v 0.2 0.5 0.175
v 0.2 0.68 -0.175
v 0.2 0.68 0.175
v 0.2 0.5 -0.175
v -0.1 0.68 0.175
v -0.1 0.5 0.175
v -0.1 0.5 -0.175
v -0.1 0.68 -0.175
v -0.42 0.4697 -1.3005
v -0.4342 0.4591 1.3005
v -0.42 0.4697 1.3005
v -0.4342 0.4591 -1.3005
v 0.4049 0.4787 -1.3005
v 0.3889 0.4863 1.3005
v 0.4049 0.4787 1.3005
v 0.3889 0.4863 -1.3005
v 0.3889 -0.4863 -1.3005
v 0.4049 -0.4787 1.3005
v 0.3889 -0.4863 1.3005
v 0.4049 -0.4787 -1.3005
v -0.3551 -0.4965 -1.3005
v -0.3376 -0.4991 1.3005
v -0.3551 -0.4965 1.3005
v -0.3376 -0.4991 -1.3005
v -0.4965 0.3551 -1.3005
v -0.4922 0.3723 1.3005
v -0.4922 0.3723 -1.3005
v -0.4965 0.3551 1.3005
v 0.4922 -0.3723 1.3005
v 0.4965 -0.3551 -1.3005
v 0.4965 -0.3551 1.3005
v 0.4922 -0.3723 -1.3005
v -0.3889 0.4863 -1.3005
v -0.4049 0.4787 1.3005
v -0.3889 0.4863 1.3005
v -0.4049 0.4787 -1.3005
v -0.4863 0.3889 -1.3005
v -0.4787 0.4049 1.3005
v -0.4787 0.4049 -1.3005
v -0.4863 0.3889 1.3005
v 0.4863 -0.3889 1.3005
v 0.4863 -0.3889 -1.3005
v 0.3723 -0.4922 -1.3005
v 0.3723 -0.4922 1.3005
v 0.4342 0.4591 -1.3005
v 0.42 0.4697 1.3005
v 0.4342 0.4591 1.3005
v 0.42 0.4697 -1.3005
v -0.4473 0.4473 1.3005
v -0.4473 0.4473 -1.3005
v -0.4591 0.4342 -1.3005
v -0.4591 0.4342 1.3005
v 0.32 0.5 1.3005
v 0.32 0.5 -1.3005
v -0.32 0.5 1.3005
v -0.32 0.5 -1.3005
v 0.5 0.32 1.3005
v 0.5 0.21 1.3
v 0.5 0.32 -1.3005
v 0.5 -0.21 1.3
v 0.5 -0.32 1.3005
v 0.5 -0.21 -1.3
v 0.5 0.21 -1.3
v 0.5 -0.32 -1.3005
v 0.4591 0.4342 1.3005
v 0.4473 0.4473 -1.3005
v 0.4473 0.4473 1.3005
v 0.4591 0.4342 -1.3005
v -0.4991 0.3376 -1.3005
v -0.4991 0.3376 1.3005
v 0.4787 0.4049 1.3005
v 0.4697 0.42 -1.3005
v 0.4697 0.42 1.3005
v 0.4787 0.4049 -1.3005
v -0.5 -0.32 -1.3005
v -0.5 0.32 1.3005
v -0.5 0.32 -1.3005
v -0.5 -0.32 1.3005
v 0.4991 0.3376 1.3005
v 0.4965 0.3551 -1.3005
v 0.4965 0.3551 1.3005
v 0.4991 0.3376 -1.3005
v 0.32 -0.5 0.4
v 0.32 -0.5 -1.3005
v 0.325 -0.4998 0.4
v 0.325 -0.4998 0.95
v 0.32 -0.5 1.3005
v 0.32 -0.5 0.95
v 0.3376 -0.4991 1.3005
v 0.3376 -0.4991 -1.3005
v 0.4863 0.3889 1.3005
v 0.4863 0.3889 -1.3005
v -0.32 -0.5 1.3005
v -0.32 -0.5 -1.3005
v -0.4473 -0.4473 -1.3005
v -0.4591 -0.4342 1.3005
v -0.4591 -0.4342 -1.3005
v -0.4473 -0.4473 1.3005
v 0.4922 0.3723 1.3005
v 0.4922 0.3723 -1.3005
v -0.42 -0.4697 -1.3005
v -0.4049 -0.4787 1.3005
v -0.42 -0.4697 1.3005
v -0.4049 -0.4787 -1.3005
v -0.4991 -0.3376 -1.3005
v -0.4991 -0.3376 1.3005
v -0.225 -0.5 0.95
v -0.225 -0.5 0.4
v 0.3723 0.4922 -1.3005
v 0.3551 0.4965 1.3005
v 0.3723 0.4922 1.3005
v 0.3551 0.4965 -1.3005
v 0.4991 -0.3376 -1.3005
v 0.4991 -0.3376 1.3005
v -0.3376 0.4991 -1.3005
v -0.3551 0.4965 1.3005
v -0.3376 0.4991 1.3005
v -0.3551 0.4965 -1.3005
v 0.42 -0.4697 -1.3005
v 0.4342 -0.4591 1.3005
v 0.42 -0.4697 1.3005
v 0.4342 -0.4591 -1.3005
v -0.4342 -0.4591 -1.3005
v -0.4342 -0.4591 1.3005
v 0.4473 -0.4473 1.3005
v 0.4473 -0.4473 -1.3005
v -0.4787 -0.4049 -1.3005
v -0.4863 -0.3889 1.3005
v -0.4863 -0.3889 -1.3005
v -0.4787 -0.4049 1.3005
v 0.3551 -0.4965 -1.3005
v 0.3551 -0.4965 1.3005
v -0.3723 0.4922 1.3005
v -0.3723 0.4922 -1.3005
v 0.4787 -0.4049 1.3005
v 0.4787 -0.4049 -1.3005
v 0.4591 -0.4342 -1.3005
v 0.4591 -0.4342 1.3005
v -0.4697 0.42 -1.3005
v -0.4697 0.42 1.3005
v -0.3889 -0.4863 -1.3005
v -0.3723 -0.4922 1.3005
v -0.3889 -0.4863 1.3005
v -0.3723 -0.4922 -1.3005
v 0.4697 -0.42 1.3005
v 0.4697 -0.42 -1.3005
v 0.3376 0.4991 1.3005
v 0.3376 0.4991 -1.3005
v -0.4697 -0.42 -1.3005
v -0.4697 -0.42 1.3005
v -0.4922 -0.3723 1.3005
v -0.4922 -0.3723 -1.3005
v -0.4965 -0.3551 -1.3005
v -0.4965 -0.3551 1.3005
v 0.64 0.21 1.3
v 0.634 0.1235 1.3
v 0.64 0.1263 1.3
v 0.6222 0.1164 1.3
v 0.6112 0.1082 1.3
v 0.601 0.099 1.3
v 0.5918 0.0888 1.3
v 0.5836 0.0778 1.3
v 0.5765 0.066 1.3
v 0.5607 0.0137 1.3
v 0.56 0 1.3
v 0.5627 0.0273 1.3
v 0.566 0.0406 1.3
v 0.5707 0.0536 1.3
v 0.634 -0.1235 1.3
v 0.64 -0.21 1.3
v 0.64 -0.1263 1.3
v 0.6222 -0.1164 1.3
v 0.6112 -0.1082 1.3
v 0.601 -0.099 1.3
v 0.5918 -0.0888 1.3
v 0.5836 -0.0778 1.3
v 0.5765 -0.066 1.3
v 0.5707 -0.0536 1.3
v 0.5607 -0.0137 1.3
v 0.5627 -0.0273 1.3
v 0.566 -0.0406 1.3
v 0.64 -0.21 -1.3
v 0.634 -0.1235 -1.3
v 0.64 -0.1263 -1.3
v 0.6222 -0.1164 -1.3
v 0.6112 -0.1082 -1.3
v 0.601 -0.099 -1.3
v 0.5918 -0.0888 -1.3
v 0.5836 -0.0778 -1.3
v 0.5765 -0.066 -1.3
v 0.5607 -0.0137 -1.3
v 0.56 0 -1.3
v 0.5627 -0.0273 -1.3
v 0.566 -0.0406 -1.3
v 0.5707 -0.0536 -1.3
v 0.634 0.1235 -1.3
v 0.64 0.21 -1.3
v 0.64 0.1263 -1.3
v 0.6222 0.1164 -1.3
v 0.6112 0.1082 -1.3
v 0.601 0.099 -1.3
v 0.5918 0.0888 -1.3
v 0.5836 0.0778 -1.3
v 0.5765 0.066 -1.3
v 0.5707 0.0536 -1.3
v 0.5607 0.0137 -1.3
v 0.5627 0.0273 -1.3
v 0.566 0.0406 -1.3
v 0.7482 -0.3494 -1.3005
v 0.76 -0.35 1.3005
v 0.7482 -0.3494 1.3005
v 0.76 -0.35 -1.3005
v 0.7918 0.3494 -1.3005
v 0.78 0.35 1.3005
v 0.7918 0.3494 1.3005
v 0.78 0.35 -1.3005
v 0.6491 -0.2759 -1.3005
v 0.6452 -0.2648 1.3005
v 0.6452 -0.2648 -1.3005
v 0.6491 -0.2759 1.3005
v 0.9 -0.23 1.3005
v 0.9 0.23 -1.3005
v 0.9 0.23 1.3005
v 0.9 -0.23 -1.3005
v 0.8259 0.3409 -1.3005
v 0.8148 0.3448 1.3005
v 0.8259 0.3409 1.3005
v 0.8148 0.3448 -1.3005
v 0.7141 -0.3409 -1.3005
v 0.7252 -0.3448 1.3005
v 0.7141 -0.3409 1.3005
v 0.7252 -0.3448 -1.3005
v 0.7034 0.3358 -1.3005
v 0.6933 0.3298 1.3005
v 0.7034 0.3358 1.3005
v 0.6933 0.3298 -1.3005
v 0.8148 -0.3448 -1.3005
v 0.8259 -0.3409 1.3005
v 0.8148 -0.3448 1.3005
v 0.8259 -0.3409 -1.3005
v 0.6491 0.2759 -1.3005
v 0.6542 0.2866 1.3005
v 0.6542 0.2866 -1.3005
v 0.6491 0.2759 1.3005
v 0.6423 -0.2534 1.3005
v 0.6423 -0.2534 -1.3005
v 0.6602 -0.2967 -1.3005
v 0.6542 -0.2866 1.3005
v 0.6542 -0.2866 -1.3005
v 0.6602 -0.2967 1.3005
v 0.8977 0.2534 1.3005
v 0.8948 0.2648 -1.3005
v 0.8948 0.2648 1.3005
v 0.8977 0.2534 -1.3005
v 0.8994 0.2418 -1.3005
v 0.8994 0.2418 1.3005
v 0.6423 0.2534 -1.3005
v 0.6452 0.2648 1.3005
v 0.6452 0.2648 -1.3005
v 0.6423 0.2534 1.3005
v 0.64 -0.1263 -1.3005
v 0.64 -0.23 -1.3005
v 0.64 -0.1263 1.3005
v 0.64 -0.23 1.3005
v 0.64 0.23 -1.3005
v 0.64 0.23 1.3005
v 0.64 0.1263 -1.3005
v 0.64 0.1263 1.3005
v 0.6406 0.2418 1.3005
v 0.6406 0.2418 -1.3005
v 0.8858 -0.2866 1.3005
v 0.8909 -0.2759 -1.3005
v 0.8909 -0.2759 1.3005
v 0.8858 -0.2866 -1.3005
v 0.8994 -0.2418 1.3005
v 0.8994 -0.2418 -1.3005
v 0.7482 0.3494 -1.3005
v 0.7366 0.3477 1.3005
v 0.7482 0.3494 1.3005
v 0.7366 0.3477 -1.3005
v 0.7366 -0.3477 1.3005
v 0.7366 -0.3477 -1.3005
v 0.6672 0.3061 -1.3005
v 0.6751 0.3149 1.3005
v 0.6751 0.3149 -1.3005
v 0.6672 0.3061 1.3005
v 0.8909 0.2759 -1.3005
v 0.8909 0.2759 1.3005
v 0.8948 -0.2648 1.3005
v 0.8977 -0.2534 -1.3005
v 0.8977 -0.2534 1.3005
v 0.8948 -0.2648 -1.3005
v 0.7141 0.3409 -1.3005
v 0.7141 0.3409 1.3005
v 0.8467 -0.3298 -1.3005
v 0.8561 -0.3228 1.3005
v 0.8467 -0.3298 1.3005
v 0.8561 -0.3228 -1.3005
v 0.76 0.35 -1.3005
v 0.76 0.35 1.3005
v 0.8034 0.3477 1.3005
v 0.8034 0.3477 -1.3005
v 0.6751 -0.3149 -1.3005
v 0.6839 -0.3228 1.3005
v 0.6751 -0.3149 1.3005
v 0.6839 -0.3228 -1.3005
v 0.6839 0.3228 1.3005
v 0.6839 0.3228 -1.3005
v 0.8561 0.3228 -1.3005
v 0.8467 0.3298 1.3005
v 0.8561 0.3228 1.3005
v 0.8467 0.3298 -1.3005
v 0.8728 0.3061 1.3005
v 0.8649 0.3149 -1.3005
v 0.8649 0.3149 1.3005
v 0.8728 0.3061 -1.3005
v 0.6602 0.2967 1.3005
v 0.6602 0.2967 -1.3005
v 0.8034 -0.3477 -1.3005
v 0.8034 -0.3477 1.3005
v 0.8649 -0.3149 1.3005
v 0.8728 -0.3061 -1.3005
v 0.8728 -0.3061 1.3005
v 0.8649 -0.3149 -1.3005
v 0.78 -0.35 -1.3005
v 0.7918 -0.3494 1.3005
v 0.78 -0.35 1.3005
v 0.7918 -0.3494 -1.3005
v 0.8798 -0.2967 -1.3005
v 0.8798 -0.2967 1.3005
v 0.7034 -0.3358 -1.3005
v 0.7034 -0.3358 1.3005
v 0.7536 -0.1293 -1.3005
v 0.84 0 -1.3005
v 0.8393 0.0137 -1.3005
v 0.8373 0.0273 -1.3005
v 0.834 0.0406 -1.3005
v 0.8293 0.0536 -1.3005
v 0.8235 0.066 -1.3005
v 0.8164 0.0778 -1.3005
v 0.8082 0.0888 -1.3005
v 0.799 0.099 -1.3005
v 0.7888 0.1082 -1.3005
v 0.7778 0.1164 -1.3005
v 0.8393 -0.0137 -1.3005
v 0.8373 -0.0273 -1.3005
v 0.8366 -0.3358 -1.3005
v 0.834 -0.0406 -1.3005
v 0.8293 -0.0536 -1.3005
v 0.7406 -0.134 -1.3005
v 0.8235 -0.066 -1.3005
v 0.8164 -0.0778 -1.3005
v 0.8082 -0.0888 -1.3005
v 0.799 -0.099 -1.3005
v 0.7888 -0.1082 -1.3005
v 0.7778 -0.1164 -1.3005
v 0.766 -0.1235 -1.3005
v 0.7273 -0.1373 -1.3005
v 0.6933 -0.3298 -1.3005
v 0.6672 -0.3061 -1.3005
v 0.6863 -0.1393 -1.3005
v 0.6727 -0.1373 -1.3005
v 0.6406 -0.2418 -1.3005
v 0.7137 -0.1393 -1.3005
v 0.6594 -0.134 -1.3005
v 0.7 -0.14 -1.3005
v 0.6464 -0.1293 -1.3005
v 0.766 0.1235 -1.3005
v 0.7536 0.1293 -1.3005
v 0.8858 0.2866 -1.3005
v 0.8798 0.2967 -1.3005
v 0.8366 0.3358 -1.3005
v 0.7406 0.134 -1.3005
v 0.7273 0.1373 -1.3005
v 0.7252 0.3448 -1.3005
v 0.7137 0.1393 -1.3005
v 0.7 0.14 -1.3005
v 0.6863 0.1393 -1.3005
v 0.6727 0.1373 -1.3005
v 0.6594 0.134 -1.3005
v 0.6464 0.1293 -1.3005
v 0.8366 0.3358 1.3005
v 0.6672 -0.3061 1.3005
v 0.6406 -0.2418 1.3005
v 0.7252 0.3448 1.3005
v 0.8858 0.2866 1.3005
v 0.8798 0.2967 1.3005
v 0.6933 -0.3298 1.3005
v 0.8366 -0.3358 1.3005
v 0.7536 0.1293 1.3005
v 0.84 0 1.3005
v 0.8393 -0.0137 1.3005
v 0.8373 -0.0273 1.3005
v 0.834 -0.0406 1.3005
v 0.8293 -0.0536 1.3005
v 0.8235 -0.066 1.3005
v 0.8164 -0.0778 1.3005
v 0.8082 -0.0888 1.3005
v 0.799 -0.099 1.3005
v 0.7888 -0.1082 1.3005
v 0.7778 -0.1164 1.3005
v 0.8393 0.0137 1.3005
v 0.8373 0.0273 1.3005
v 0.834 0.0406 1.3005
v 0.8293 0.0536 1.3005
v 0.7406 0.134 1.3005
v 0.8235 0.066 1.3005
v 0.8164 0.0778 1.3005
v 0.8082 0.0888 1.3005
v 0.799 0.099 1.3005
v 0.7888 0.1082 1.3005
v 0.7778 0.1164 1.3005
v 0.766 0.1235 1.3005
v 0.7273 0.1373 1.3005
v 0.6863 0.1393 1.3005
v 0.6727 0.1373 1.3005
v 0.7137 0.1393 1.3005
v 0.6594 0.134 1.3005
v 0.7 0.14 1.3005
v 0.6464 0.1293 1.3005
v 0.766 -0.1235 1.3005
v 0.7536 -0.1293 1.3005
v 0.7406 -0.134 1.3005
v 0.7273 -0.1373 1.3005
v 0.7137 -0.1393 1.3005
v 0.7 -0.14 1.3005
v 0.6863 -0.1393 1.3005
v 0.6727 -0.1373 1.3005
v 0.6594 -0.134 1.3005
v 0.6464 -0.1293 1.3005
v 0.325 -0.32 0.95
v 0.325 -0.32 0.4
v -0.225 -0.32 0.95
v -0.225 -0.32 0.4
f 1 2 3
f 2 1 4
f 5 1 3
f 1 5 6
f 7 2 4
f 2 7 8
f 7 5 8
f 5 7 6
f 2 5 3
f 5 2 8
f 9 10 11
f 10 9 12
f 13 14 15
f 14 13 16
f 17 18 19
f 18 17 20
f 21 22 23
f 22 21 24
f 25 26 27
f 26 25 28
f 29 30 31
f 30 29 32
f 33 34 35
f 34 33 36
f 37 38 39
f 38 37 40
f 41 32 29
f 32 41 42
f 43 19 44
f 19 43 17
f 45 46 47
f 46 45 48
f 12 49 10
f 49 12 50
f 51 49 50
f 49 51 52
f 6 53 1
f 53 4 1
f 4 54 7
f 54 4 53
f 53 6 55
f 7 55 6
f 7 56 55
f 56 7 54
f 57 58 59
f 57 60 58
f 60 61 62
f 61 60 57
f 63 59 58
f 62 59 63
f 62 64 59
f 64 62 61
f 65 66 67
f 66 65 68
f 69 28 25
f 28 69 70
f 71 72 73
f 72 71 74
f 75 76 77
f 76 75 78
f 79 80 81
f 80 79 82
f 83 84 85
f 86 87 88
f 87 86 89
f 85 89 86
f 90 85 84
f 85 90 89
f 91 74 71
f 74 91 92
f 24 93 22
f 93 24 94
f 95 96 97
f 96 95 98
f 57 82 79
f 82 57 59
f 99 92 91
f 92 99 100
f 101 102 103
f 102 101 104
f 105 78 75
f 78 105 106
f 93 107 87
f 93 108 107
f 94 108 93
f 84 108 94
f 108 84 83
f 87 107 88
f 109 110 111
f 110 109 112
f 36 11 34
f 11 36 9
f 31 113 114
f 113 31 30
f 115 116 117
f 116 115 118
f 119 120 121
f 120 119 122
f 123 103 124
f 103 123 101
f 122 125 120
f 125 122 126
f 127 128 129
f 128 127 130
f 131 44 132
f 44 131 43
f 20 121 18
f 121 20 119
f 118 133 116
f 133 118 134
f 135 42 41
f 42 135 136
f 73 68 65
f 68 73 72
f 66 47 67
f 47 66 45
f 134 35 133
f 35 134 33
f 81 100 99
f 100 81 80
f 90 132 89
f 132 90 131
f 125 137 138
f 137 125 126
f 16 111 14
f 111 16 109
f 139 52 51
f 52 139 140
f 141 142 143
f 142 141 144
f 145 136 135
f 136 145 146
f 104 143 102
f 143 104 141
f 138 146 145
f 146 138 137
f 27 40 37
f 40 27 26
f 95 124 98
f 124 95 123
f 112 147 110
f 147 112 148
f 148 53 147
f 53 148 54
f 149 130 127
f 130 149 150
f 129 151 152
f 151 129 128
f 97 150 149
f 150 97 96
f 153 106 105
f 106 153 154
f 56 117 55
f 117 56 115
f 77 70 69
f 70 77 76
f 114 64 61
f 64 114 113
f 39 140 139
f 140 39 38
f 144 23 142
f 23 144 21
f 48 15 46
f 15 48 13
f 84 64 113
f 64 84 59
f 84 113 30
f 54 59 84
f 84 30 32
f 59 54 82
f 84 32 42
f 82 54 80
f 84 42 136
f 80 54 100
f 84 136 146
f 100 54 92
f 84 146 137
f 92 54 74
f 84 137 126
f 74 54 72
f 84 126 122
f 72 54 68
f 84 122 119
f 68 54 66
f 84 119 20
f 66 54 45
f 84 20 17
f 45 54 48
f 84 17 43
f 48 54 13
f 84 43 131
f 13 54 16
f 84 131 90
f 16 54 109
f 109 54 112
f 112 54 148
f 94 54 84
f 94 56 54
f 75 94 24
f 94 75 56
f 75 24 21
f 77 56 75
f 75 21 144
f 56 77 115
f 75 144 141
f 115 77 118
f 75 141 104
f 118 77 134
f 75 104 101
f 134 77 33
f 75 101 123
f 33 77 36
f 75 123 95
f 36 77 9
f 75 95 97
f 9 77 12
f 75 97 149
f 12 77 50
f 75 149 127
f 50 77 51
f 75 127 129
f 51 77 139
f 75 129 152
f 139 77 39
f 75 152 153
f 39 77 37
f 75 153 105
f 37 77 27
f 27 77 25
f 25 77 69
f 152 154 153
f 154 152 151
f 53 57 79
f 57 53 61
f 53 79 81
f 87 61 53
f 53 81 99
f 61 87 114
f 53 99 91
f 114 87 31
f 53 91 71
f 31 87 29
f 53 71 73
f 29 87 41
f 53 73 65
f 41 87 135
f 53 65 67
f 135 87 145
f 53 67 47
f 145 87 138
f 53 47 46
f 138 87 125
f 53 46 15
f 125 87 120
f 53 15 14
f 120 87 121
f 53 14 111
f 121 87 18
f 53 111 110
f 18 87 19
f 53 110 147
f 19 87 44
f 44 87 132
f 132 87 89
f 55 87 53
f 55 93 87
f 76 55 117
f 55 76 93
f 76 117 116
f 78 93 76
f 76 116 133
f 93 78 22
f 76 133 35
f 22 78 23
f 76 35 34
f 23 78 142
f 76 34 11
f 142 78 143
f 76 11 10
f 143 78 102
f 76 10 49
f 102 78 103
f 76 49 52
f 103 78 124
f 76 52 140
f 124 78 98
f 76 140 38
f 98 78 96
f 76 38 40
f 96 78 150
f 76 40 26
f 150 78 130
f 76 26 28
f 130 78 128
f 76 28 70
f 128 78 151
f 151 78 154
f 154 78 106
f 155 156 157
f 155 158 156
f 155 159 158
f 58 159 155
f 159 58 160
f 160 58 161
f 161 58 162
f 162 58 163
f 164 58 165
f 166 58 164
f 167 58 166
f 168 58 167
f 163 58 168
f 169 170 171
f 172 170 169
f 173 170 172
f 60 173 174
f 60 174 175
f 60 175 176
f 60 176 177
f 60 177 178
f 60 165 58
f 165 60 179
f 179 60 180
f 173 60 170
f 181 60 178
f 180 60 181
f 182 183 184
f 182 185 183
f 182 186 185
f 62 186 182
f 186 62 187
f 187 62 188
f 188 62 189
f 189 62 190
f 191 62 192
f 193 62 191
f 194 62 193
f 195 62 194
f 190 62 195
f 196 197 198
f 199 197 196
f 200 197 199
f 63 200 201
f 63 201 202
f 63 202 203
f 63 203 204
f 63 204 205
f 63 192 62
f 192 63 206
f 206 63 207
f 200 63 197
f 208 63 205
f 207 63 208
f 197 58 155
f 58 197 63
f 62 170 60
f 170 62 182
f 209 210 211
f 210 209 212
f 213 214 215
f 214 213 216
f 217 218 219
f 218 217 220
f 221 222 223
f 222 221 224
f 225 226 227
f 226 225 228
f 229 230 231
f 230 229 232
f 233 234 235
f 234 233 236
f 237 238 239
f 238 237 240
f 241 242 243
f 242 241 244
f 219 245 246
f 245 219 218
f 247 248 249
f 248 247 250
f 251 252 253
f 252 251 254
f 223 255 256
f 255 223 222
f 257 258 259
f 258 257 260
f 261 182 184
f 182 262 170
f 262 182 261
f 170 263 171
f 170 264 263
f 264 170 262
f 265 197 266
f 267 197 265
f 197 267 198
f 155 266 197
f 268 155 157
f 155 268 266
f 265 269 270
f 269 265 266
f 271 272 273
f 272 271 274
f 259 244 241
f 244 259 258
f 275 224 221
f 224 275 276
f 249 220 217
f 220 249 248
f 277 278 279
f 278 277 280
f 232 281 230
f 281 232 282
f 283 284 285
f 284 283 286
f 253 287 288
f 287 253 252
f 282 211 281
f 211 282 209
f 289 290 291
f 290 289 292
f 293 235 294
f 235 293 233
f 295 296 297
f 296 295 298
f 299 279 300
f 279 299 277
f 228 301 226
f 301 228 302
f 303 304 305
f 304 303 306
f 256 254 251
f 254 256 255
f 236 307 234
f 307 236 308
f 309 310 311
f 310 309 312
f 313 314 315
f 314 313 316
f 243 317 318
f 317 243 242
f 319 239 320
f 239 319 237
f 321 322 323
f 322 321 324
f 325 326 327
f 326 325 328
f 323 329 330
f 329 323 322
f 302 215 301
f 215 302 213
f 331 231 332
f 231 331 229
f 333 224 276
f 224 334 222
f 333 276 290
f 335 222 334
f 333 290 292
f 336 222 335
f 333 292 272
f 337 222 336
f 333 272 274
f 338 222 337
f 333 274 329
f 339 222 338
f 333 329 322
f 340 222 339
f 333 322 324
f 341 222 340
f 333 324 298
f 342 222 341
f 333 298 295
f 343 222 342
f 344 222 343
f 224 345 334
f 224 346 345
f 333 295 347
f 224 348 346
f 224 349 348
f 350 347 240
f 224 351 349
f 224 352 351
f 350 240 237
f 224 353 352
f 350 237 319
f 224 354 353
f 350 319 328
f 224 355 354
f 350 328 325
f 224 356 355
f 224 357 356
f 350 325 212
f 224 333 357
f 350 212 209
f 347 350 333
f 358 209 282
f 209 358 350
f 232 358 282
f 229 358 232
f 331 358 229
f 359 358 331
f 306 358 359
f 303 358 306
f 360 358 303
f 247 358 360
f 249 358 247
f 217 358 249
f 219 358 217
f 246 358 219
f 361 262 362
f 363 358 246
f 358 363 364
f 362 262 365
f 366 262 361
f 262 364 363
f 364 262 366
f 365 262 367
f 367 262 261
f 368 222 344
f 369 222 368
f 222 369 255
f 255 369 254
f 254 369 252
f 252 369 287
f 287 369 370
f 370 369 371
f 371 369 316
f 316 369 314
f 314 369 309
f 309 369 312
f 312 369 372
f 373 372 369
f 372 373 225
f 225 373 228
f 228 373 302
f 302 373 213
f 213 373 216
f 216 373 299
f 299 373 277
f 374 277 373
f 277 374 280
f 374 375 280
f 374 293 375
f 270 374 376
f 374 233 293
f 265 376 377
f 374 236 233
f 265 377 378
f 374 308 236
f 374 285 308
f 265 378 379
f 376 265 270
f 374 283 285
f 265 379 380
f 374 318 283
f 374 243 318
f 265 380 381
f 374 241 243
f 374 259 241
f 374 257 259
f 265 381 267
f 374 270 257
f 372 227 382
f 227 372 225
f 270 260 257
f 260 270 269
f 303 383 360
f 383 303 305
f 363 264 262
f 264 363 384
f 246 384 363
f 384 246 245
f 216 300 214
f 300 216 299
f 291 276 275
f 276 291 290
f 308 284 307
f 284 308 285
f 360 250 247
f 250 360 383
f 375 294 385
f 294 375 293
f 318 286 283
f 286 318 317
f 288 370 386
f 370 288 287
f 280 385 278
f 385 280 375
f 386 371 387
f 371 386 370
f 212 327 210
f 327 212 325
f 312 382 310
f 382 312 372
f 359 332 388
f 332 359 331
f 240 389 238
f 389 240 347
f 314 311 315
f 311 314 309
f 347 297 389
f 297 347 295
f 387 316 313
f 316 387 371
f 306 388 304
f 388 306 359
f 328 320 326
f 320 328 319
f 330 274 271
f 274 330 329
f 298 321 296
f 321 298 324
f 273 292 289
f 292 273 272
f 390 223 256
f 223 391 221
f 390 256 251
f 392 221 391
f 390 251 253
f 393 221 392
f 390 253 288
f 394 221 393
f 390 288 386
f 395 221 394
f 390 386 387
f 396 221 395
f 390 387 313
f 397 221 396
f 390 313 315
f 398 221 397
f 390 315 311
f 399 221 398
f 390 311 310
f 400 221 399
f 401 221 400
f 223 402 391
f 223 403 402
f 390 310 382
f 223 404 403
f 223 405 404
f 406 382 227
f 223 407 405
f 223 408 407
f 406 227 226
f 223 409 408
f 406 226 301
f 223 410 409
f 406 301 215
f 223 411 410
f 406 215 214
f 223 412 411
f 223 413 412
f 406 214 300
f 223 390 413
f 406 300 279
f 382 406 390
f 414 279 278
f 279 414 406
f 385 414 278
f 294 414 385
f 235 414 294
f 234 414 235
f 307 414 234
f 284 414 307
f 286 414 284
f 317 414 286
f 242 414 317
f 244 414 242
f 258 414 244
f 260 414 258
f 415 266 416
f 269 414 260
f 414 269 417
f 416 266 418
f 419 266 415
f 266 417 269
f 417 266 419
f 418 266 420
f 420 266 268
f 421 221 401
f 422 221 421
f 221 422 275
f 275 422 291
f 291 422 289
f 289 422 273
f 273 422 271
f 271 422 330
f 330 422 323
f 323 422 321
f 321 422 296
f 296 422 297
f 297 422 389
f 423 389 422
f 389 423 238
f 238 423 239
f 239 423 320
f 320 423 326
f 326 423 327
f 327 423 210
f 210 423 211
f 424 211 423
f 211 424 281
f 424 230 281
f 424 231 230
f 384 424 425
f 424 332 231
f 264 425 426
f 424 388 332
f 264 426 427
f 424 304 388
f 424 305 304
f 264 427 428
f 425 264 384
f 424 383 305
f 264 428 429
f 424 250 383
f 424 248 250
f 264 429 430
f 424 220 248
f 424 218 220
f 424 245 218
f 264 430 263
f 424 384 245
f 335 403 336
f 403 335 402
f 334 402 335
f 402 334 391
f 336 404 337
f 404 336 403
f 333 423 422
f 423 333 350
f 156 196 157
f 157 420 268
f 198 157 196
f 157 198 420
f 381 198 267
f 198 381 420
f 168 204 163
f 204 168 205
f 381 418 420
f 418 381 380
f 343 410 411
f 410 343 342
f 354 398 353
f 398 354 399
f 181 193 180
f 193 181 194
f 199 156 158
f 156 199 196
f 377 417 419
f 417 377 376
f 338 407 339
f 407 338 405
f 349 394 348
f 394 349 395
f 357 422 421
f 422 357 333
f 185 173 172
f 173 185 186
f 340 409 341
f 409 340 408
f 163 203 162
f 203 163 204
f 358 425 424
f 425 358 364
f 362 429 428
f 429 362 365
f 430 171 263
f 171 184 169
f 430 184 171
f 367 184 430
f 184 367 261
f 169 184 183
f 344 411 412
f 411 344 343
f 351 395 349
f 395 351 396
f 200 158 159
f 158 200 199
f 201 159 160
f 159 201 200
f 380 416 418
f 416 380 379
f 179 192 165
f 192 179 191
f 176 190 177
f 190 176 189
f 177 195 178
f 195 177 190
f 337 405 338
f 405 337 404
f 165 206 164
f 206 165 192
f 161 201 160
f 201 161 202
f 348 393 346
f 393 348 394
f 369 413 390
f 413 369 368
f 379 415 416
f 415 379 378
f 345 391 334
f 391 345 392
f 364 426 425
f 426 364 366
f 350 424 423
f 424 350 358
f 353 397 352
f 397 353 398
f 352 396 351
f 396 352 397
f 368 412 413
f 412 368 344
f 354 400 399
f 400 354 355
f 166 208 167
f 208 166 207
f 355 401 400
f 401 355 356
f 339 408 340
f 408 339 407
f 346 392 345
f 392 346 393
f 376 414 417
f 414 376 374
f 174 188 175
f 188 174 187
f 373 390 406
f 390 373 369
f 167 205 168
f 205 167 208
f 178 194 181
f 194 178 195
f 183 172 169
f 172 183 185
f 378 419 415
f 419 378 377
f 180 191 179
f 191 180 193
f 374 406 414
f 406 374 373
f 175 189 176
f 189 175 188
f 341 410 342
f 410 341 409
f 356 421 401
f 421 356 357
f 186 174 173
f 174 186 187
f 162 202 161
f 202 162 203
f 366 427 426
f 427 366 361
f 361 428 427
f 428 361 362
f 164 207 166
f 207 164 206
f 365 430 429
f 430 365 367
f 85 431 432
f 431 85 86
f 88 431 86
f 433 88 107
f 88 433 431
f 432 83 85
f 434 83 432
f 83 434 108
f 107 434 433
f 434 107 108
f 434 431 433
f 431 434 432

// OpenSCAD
// Compact housing with neck+tab (through-hole), side latch boss, and opposite-face recess
// Target bounding box: 1.4 x 1.0 x 2.6 mm  (X x Y x Z)

$fn = 64;

// --- Bounding box (overall) ---
bbox_X = 1.4;
bbox_Y = 1.0;
bbox_Z = 2.6;

// --- Main housing (rounded-rect) ---
housing_X = 1.00;                 // along X
housing_Y = bbox_Y;               // along Y
housing_Z = bbox_Z;               // along Z
housing_r = 0.18;                 // corner radius in XY

// --- Neck + tab (handle) on +X side ---
neck_X = 0.18;
neck_Y = 0.42;
neck_Z = bbox_Z;

tab_X  = bbox_X - housing_X - neck_X;   // ensures overall X matches bbox_X
tab_Y  = 0.70;
tab_Z  = bbox_Z;

hole_d = 0.28;
hole_from_tab_end = 0.20;          // from +X end of tab to hole center

// --- Side latch boss on +Y face (protruding) ---
latch_X = 0.30;
latch_Y = 0.18;
latch_Z = 0.35;
latch_from_housing_negX = 0.55;    // measured from housing -X end toward +X

// Make latch more "latch-like" with a small step/hook on its outer end
hook_X = 0.14;
hook_Y = 0.10;
hook_Z = 0.18;

// --- Recess notch on -Y face (shallow relief) ---
recess_X = 0.55;
recess_Y_depth = 0.14;             // shallow bite into -Y face
recess_Z = 0.55;
recess_from_housing_negX = 0.55;   // measured from housing -X end toward +X
recess_z_from_top = 0.35;          // closer to top so it reads in ortho views

// Small overlap to guarantee watertight unions/differences
eps = 0.02;

// ---------- Helpers ----------
module rounded_rect_prism_xy(size=[1,1,1], r=0.1, center=true) {
    rr = min(r, min(size[0], size[1]) / 2 - 1e-6);
    minkowski() {
        cube([size[0] - 2*rr, size[1] - 2*rr, size[2]], center=center);
        cylinder(r=rr, h=0.001, center=true);
    }
}

module housing_main() {
    rounded_rect_prism_xy([housing_X, housing_Y, housing_Z], housing_r, center=true);
}

module neck_block() {
    // Connected to housing on +X side with slight overlap
    translate([housing_X/2 + neck_X/2 - eps, 0, 0])
        cube([neck_X + 2*eps, neck_Y, neck_Z], center=true);
}

module tab_block() {
    // Connected to neck on +X side with slight overlap
    translate([housing_X/2 + neck_X + tab_X/2 - eps, 0, 0])
        rounded_rect_prism_xy(
            [tab_X + 2*eps, tab_Y, tab_Z],
            r=min(0.12, tab_Y/2 - 1e-6),
            center=true
        );
}

module hole_cut() {
    // Through-hole along Z, centered in Y, positioned from +X end of tab
    x_end  = housing_X/2 + neck_X + tab_X;     // +X end of tab (relative to origin)
    x_hole = x_end - hole_from_tab_end;
    translate([x_hole, 0, 0])
        cylinder(d=hole_d, h=bbox_Z + 2, center=true);
}

module latch_boss() {
    // Protrudes from +Y face of housing; positioned along X from housing -X end
    x0 = -housing_X/2 + latch_from_housing_negX;

    union() {
        // main boss (overlaps into housing slightly for solid connection)
        translate([x0, housing_Y/2 + latch_Y/2 - eps, 0])
            cube([latch_X, latch_Y + 2*eps, latch_Z], center=true);

        // small "hook/step" on the outer (+Y) end to read as a latch
        // placed on the boss' outer face, slightly toward +X and +Z
        translate([
            x0 + (latch_X/2 - hook_X/2) - eps,
            housing_Y/2 + latch_Y - hook_Y/2 - eps,
            (latch_Z/2 - hook_Z/2) - eps
        ])
            cube([hook_X, hook_Y + 2*eps, hook_Z], center=true);
    }
}

module recess_cut() {
    // Shallow recess into -Y face of housing (not through), clearly visible:
    // - anchored to the -Y face
    // - shifted upward in Z
    x0 = -housing_X/2 + recess_from_housing_negX;

    // Center the recess near the top (+Z) while staying inside the housing
    z0 = housing_Z/2 - recess_z_from_top - recess_Z/2;
    z0_clamped = max(-housing_Z/2 + recess_Z/2 + eps, min(housing_Z/2 - recess_Z/2 - eps, z0));

    // Place cutter so it bites into the -Y face by recess_Y_depth
    // Center of cutter is inside the housing by half the depth.
    y0 = -housing_Y/2 + recess_Y_depth/2 + eps;

    translate([x0, y0, z0_clamped])
        cube([recess_X, recess_Y_depth + 2*eps, recess_Z], center=true);
}

// ---------- Final solid ----------
difference() {
    union() {
        housing_main();
        neck_block();
        tab_block();
        latch_boss();
    }
    hole_cut();
    recess_cut();
}
